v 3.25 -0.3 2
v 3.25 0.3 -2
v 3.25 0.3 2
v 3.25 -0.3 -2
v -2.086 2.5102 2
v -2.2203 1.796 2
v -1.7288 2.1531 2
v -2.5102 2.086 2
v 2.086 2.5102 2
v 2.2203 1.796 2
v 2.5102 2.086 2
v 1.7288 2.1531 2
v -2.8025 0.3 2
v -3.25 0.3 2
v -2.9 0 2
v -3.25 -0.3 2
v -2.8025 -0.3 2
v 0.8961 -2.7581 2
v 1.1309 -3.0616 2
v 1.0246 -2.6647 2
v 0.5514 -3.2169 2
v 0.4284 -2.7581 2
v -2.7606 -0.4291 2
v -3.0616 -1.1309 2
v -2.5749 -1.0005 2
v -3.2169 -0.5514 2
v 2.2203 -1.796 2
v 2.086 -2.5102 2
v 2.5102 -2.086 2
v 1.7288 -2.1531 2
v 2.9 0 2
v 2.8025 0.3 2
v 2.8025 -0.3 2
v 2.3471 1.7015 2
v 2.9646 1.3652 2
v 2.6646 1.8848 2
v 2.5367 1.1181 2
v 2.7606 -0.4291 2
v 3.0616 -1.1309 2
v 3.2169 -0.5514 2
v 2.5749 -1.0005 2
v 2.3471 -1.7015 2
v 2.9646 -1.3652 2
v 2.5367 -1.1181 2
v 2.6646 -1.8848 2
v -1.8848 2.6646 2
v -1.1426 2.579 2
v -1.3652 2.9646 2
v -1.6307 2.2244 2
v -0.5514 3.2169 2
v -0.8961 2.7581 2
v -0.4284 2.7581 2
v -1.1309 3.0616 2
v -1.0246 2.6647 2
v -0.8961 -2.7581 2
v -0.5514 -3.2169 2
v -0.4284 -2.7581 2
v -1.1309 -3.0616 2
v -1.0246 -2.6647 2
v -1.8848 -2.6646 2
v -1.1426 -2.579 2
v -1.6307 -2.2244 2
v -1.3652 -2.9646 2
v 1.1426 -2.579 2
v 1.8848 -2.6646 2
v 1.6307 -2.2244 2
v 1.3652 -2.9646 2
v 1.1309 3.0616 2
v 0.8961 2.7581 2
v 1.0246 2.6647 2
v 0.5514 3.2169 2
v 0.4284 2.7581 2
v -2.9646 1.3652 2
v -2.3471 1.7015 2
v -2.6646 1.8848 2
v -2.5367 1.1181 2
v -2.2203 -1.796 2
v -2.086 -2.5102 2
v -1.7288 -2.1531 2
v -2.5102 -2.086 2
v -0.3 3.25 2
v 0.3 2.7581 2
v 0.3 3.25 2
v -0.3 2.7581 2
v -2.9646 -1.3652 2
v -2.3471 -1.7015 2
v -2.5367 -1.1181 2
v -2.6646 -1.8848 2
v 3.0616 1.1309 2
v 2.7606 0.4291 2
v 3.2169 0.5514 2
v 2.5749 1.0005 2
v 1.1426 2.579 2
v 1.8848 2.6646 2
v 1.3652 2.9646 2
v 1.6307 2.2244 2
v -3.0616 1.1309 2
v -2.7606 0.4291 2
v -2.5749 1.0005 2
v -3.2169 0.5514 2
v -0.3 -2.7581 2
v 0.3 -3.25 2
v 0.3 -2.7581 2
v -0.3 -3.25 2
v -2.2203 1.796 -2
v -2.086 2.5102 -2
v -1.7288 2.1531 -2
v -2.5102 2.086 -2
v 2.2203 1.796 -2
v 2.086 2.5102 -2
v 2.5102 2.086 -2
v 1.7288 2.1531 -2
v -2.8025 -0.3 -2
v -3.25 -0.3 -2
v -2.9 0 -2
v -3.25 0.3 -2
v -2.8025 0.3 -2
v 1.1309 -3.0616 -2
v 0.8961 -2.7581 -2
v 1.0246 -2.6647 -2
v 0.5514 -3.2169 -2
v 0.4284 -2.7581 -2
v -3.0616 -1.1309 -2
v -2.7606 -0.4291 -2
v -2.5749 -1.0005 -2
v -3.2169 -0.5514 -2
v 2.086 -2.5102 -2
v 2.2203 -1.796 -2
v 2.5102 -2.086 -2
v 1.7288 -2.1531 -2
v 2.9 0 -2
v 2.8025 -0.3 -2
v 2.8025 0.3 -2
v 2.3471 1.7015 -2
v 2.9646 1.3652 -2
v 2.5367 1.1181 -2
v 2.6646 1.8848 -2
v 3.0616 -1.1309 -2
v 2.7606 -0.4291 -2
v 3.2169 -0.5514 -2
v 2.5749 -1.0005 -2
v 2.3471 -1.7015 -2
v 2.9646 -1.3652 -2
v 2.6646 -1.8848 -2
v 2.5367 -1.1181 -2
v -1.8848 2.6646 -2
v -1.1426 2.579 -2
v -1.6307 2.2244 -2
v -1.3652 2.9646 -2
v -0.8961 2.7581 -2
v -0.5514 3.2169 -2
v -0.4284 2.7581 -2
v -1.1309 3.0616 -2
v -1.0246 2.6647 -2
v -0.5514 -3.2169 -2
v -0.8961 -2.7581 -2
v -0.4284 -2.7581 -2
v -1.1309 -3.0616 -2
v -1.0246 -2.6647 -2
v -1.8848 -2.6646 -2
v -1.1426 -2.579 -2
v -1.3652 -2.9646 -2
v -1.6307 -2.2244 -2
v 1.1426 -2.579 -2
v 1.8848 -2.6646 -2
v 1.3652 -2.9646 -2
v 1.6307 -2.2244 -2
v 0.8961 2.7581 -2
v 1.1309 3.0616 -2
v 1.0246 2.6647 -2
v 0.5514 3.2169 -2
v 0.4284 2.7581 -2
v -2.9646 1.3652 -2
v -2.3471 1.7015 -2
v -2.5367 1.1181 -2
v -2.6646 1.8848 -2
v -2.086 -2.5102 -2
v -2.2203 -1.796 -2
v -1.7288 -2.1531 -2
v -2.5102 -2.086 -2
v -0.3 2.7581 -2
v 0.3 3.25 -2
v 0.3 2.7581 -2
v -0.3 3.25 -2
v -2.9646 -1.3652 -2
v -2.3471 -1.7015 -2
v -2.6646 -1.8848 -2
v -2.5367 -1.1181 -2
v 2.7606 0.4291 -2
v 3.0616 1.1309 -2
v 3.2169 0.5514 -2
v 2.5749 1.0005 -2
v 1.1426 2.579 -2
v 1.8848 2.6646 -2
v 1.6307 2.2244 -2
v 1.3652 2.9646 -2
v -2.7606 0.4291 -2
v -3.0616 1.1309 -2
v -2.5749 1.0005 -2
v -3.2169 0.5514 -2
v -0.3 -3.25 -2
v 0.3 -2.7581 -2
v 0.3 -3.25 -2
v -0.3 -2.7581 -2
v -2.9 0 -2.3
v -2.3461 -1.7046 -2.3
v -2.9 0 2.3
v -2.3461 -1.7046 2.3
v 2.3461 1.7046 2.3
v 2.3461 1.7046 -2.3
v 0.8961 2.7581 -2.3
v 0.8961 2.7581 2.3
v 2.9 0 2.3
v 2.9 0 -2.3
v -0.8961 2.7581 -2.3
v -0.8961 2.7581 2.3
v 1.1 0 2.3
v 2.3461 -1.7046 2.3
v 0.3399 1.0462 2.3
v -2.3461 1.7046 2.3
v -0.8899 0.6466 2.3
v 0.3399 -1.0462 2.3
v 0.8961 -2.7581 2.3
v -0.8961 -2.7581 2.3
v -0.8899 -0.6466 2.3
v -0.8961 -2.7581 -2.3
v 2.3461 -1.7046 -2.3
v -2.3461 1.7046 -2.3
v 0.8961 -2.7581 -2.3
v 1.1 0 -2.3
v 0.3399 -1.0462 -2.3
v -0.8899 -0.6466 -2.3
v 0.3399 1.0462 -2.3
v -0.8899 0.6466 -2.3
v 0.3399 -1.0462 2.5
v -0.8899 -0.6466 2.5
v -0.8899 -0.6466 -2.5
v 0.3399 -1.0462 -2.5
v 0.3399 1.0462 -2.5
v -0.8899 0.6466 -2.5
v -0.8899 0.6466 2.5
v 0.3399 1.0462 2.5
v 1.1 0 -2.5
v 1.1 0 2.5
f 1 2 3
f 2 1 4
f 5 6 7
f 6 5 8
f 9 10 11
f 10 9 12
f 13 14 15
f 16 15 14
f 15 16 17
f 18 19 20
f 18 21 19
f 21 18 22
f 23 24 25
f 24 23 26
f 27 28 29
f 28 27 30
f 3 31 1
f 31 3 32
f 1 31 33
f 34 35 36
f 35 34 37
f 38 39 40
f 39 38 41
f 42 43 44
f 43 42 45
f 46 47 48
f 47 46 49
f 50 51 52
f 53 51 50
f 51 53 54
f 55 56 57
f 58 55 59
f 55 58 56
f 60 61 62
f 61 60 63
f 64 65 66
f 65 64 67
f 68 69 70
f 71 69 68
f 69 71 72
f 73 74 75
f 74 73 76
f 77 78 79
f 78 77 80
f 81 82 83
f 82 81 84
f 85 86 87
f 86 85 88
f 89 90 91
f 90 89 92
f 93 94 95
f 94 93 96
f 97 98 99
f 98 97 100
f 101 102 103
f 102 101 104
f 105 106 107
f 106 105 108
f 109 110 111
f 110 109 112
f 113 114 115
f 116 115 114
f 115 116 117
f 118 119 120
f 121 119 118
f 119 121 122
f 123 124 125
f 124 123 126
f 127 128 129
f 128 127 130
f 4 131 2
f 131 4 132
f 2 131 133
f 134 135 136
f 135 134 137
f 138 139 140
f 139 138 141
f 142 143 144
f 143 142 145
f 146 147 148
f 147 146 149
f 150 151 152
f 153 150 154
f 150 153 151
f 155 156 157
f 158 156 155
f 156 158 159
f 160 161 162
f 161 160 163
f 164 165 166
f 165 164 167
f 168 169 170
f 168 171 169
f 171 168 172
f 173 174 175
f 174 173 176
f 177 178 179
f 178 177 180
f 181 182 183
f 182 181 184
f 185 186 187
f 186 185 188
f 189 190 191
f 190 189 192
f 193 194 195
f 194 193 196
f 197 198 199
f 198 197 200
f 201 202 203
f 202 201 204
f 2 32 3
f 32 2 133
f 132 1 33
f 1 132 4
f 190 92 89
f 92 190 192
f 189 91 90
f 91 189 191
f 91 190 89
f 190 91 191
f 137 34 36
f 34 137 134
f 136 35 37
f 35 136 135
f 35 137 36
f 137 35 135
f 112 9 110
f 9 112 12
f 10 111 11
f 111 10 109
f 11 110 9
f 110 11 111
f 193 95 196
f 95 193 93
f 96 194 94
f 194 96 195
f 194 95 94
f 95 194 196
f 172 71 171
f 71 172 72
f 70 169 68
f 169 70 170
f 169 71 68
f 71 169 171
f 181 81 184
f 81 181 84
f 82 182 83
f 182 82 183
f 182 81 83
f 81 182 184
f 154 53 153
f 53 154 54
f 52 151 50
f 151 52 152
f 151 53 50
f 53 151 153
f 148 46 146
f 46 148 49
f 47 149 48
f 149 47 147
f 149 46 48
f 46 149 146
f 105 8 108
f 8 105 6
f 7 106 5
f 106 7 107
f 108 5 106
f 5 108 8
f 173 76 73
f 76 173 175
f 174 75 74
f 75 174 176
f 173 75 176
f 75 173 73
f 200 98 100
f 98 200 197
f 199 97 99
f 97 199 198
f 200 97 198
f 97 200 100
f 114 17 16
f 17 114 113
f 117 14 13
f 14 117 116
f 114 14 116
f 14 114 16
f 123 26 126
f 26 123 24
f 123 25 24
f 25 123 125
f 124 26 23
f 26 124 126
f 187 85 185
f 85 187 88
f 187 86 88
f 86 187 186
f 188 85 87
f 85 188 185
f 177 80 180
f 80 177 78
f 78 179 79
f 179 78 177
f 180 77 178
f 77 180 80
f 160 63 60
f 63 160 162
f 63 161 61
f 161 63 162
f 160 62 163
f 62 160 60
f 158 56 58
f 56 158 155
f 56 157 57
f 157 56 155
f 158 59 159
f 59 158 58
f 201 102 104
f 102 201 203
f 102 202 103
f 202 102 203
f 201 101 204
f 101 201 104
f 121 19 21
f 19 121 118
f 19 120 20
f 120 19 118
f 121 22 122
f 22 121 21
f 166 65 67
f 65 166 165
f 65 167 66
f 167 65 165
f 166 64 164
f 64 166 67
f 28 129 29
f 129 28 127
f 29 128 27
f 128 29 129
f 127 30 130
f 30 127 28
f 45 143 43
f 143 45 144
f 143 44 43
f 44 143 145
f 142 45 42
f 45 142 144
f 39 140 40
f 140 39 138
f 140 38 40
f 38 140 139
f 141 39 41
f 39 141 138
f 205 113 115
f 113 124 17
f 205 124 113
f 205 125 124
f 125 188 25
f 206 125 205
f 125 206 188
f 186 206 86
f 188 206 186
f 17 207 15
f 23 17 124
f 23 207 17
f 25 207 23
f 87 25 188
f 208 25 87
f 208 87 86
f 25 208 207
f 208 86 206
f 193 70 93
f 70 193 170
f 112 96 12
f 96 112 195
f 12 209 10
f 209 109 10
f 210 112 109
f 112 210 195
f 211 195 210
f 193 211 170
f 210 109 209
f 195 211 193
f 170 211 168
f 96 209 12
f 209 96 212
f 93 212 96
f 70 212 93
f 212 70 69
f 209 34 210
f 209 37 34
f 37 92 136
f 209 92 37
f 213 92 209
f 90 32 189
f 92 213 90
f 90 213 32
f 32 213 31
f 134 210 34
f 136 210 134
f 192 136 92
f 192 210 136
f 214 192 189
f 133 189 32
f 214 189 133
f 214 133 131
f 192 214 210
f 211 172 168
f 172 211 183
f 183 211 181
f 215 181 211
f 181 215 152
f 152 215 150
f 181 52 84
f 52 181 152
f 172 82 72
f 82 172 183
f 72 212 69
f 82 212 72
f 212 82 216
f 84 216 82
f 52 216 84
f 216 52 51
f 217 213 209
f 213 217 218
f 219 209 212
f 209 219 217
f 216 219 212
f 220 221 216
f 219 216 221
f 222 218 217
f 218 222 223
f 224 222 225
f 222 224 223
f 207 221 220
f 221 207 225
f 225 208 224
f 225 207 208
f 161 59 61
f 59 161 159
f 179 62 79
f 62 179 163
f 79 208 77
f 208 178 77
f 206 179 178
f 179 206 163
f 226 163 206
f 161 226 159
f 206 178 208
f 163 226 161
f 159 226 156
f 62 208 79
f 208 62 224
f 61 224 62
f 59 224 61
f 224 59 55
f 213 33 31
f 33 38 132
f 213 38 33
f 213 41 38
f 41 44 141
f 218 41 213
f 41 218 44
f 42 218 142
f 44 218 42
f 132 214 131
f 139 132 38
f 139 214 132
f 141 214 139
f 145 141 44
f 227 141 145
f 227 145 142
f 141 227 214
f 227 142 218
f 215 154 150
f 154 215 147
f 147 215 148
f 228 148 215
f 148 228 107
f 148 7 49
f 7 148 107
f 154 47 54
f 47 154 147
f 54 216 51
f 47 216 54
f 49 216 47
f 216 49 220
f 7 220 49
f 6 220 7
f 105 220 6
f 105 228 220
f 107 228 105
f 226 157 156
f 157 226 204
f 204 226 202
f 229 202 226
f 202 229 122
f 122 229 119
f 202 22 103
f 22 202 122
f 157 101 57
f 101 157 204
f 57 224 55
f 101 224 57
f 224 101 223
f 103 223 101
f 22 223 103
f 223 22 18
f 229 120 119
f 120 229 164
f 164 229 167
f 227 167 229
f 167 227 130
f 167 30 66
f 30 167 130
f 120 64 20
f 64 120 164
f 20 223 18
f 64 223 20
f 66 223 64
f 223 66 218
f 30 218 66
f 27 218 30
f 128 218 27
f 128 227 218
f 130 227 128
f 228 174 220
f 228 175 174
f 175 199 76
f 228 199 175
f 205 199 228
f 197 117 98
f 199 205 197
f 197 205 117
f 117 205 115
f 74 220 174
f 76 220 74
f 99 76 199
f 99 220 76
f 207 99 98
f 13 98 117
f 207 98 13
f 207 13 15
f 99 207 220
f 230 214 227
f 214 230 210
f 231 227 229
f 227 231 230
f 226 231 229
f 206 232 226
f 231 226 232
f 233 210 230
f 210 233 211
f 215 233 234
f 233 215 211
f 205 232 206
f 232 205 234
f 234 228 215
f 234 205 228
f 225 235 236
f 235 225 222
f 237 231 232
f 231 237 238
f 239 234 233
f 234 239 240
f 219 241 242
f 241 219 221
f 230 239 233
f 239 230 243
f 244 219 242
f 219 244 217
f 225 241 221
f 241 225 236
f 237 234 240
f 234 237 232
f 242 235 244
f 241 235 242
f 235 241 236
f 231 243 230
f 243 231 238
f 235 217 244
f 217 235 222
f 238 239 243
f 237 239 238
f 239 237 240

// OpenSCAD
// Parameters
screw_nominal_diameter_mm = 2.5; //[1.25:5:0.05]
outer_diameter_mm = 5.8; //[2.9:11.6:0.05]
length_mm = 4.6; //[2.3:9.2:0.05]
tolerance_outer_diameter_mm = 0; //[-0.2:0.2:0.01]
tolerance_length_mm = 0; //[-0.2:0.2:0.01]
chamfer_mm = 0.3; //[0.1:0.8:0.05]
knurl_depth_mm = 0.35; //[0.15:0.8:0.05]
knurl_count = 24; //[12:48:1]
knurl_width_mm = 0.6; //[0.3:1.2:0.05]
knurl_overlap_mm = 0.8; //[0.3:1.5:0.05]
bore_diameter_mm = 2.1; //[1.6:2.6:0.05]
bore_clearance_mm = 0.1; //[0:0.3:0.01]
eps_mm = 0.2; //[0.05:0.5:0.05]

// Threaded Insert - complete geometry
module threaded_insert() {
  color("Brass") {
    // Insert body
    union() {
      cylinder(
        r=(outer_diameter_mm + tolerance_outer_diameter_mm) / 2,
        h=length_mm + tolerance_length_mm,
        center=true
      );

      // Lead-in chamfer
      translate([0, 0, (length_mm + tolerance_length_mm) / 2 - chamfer_mm / 2])
        cylinder(
          r1=(outer_diameter_mm + tolerance_outer_diameter_mm) / 2,
          r2=max((outer_diameter_mm + tolerance_outer_diameter_mm) / 2 - chamfer_mm, (outer_diameter_mm + tolerance_outer_diameter_mm) / 2 * 0.7),
          h=chamfer_mm,
          center=true
        );

      // Installation end chamfer
      translate([0, 0, -(length_mm + tolerance_length_mm) / 2 + chamfer_mm / 2])
        cylinder(
          r1=max((outer_diameter_mm + tolerance_outer_diameter_mm) / 2 - chamfer_mm, (outer_diameter_mm + tolerance_outer_diameter_mm) / 2 * 0.7),
          r2=(outer_diameter_mm + tolerance_outer_diameter_mm) / 2,
          h=chamfer_mm,
          center=true
        );

      // Knurl ribs
      for (i = [0:knurl_count-1]) {
        rotate([0, 0, i * 360 / knurl_count])
          translate([(outer_diameter_mm + tolerance_outer_diameter_mm) / 2 + (knurl_depth_mm + knurl_overlap_mm) / 2 - knurl_overlap_mm, 0, 0])
          cube(
            [knurl_depth_mm + knurl_overlap_mm, knurl_width_mm, length_mm + tolerance_length_mm - 2 * chamfer_mm],
            center=true
          );
      }
    }

    // Internal thread or clearance bore
    difference() {
      cylinder(
        r=(bore_diameter_mm + bore_clearance_mm) / 2,
        h=length_mm + tolerance_length_mm + 2 * eps_mm,
        center=true
      );
    }
  }
}

// Assembly
module assembly() {
  threaded_insert();
}

assembly();
